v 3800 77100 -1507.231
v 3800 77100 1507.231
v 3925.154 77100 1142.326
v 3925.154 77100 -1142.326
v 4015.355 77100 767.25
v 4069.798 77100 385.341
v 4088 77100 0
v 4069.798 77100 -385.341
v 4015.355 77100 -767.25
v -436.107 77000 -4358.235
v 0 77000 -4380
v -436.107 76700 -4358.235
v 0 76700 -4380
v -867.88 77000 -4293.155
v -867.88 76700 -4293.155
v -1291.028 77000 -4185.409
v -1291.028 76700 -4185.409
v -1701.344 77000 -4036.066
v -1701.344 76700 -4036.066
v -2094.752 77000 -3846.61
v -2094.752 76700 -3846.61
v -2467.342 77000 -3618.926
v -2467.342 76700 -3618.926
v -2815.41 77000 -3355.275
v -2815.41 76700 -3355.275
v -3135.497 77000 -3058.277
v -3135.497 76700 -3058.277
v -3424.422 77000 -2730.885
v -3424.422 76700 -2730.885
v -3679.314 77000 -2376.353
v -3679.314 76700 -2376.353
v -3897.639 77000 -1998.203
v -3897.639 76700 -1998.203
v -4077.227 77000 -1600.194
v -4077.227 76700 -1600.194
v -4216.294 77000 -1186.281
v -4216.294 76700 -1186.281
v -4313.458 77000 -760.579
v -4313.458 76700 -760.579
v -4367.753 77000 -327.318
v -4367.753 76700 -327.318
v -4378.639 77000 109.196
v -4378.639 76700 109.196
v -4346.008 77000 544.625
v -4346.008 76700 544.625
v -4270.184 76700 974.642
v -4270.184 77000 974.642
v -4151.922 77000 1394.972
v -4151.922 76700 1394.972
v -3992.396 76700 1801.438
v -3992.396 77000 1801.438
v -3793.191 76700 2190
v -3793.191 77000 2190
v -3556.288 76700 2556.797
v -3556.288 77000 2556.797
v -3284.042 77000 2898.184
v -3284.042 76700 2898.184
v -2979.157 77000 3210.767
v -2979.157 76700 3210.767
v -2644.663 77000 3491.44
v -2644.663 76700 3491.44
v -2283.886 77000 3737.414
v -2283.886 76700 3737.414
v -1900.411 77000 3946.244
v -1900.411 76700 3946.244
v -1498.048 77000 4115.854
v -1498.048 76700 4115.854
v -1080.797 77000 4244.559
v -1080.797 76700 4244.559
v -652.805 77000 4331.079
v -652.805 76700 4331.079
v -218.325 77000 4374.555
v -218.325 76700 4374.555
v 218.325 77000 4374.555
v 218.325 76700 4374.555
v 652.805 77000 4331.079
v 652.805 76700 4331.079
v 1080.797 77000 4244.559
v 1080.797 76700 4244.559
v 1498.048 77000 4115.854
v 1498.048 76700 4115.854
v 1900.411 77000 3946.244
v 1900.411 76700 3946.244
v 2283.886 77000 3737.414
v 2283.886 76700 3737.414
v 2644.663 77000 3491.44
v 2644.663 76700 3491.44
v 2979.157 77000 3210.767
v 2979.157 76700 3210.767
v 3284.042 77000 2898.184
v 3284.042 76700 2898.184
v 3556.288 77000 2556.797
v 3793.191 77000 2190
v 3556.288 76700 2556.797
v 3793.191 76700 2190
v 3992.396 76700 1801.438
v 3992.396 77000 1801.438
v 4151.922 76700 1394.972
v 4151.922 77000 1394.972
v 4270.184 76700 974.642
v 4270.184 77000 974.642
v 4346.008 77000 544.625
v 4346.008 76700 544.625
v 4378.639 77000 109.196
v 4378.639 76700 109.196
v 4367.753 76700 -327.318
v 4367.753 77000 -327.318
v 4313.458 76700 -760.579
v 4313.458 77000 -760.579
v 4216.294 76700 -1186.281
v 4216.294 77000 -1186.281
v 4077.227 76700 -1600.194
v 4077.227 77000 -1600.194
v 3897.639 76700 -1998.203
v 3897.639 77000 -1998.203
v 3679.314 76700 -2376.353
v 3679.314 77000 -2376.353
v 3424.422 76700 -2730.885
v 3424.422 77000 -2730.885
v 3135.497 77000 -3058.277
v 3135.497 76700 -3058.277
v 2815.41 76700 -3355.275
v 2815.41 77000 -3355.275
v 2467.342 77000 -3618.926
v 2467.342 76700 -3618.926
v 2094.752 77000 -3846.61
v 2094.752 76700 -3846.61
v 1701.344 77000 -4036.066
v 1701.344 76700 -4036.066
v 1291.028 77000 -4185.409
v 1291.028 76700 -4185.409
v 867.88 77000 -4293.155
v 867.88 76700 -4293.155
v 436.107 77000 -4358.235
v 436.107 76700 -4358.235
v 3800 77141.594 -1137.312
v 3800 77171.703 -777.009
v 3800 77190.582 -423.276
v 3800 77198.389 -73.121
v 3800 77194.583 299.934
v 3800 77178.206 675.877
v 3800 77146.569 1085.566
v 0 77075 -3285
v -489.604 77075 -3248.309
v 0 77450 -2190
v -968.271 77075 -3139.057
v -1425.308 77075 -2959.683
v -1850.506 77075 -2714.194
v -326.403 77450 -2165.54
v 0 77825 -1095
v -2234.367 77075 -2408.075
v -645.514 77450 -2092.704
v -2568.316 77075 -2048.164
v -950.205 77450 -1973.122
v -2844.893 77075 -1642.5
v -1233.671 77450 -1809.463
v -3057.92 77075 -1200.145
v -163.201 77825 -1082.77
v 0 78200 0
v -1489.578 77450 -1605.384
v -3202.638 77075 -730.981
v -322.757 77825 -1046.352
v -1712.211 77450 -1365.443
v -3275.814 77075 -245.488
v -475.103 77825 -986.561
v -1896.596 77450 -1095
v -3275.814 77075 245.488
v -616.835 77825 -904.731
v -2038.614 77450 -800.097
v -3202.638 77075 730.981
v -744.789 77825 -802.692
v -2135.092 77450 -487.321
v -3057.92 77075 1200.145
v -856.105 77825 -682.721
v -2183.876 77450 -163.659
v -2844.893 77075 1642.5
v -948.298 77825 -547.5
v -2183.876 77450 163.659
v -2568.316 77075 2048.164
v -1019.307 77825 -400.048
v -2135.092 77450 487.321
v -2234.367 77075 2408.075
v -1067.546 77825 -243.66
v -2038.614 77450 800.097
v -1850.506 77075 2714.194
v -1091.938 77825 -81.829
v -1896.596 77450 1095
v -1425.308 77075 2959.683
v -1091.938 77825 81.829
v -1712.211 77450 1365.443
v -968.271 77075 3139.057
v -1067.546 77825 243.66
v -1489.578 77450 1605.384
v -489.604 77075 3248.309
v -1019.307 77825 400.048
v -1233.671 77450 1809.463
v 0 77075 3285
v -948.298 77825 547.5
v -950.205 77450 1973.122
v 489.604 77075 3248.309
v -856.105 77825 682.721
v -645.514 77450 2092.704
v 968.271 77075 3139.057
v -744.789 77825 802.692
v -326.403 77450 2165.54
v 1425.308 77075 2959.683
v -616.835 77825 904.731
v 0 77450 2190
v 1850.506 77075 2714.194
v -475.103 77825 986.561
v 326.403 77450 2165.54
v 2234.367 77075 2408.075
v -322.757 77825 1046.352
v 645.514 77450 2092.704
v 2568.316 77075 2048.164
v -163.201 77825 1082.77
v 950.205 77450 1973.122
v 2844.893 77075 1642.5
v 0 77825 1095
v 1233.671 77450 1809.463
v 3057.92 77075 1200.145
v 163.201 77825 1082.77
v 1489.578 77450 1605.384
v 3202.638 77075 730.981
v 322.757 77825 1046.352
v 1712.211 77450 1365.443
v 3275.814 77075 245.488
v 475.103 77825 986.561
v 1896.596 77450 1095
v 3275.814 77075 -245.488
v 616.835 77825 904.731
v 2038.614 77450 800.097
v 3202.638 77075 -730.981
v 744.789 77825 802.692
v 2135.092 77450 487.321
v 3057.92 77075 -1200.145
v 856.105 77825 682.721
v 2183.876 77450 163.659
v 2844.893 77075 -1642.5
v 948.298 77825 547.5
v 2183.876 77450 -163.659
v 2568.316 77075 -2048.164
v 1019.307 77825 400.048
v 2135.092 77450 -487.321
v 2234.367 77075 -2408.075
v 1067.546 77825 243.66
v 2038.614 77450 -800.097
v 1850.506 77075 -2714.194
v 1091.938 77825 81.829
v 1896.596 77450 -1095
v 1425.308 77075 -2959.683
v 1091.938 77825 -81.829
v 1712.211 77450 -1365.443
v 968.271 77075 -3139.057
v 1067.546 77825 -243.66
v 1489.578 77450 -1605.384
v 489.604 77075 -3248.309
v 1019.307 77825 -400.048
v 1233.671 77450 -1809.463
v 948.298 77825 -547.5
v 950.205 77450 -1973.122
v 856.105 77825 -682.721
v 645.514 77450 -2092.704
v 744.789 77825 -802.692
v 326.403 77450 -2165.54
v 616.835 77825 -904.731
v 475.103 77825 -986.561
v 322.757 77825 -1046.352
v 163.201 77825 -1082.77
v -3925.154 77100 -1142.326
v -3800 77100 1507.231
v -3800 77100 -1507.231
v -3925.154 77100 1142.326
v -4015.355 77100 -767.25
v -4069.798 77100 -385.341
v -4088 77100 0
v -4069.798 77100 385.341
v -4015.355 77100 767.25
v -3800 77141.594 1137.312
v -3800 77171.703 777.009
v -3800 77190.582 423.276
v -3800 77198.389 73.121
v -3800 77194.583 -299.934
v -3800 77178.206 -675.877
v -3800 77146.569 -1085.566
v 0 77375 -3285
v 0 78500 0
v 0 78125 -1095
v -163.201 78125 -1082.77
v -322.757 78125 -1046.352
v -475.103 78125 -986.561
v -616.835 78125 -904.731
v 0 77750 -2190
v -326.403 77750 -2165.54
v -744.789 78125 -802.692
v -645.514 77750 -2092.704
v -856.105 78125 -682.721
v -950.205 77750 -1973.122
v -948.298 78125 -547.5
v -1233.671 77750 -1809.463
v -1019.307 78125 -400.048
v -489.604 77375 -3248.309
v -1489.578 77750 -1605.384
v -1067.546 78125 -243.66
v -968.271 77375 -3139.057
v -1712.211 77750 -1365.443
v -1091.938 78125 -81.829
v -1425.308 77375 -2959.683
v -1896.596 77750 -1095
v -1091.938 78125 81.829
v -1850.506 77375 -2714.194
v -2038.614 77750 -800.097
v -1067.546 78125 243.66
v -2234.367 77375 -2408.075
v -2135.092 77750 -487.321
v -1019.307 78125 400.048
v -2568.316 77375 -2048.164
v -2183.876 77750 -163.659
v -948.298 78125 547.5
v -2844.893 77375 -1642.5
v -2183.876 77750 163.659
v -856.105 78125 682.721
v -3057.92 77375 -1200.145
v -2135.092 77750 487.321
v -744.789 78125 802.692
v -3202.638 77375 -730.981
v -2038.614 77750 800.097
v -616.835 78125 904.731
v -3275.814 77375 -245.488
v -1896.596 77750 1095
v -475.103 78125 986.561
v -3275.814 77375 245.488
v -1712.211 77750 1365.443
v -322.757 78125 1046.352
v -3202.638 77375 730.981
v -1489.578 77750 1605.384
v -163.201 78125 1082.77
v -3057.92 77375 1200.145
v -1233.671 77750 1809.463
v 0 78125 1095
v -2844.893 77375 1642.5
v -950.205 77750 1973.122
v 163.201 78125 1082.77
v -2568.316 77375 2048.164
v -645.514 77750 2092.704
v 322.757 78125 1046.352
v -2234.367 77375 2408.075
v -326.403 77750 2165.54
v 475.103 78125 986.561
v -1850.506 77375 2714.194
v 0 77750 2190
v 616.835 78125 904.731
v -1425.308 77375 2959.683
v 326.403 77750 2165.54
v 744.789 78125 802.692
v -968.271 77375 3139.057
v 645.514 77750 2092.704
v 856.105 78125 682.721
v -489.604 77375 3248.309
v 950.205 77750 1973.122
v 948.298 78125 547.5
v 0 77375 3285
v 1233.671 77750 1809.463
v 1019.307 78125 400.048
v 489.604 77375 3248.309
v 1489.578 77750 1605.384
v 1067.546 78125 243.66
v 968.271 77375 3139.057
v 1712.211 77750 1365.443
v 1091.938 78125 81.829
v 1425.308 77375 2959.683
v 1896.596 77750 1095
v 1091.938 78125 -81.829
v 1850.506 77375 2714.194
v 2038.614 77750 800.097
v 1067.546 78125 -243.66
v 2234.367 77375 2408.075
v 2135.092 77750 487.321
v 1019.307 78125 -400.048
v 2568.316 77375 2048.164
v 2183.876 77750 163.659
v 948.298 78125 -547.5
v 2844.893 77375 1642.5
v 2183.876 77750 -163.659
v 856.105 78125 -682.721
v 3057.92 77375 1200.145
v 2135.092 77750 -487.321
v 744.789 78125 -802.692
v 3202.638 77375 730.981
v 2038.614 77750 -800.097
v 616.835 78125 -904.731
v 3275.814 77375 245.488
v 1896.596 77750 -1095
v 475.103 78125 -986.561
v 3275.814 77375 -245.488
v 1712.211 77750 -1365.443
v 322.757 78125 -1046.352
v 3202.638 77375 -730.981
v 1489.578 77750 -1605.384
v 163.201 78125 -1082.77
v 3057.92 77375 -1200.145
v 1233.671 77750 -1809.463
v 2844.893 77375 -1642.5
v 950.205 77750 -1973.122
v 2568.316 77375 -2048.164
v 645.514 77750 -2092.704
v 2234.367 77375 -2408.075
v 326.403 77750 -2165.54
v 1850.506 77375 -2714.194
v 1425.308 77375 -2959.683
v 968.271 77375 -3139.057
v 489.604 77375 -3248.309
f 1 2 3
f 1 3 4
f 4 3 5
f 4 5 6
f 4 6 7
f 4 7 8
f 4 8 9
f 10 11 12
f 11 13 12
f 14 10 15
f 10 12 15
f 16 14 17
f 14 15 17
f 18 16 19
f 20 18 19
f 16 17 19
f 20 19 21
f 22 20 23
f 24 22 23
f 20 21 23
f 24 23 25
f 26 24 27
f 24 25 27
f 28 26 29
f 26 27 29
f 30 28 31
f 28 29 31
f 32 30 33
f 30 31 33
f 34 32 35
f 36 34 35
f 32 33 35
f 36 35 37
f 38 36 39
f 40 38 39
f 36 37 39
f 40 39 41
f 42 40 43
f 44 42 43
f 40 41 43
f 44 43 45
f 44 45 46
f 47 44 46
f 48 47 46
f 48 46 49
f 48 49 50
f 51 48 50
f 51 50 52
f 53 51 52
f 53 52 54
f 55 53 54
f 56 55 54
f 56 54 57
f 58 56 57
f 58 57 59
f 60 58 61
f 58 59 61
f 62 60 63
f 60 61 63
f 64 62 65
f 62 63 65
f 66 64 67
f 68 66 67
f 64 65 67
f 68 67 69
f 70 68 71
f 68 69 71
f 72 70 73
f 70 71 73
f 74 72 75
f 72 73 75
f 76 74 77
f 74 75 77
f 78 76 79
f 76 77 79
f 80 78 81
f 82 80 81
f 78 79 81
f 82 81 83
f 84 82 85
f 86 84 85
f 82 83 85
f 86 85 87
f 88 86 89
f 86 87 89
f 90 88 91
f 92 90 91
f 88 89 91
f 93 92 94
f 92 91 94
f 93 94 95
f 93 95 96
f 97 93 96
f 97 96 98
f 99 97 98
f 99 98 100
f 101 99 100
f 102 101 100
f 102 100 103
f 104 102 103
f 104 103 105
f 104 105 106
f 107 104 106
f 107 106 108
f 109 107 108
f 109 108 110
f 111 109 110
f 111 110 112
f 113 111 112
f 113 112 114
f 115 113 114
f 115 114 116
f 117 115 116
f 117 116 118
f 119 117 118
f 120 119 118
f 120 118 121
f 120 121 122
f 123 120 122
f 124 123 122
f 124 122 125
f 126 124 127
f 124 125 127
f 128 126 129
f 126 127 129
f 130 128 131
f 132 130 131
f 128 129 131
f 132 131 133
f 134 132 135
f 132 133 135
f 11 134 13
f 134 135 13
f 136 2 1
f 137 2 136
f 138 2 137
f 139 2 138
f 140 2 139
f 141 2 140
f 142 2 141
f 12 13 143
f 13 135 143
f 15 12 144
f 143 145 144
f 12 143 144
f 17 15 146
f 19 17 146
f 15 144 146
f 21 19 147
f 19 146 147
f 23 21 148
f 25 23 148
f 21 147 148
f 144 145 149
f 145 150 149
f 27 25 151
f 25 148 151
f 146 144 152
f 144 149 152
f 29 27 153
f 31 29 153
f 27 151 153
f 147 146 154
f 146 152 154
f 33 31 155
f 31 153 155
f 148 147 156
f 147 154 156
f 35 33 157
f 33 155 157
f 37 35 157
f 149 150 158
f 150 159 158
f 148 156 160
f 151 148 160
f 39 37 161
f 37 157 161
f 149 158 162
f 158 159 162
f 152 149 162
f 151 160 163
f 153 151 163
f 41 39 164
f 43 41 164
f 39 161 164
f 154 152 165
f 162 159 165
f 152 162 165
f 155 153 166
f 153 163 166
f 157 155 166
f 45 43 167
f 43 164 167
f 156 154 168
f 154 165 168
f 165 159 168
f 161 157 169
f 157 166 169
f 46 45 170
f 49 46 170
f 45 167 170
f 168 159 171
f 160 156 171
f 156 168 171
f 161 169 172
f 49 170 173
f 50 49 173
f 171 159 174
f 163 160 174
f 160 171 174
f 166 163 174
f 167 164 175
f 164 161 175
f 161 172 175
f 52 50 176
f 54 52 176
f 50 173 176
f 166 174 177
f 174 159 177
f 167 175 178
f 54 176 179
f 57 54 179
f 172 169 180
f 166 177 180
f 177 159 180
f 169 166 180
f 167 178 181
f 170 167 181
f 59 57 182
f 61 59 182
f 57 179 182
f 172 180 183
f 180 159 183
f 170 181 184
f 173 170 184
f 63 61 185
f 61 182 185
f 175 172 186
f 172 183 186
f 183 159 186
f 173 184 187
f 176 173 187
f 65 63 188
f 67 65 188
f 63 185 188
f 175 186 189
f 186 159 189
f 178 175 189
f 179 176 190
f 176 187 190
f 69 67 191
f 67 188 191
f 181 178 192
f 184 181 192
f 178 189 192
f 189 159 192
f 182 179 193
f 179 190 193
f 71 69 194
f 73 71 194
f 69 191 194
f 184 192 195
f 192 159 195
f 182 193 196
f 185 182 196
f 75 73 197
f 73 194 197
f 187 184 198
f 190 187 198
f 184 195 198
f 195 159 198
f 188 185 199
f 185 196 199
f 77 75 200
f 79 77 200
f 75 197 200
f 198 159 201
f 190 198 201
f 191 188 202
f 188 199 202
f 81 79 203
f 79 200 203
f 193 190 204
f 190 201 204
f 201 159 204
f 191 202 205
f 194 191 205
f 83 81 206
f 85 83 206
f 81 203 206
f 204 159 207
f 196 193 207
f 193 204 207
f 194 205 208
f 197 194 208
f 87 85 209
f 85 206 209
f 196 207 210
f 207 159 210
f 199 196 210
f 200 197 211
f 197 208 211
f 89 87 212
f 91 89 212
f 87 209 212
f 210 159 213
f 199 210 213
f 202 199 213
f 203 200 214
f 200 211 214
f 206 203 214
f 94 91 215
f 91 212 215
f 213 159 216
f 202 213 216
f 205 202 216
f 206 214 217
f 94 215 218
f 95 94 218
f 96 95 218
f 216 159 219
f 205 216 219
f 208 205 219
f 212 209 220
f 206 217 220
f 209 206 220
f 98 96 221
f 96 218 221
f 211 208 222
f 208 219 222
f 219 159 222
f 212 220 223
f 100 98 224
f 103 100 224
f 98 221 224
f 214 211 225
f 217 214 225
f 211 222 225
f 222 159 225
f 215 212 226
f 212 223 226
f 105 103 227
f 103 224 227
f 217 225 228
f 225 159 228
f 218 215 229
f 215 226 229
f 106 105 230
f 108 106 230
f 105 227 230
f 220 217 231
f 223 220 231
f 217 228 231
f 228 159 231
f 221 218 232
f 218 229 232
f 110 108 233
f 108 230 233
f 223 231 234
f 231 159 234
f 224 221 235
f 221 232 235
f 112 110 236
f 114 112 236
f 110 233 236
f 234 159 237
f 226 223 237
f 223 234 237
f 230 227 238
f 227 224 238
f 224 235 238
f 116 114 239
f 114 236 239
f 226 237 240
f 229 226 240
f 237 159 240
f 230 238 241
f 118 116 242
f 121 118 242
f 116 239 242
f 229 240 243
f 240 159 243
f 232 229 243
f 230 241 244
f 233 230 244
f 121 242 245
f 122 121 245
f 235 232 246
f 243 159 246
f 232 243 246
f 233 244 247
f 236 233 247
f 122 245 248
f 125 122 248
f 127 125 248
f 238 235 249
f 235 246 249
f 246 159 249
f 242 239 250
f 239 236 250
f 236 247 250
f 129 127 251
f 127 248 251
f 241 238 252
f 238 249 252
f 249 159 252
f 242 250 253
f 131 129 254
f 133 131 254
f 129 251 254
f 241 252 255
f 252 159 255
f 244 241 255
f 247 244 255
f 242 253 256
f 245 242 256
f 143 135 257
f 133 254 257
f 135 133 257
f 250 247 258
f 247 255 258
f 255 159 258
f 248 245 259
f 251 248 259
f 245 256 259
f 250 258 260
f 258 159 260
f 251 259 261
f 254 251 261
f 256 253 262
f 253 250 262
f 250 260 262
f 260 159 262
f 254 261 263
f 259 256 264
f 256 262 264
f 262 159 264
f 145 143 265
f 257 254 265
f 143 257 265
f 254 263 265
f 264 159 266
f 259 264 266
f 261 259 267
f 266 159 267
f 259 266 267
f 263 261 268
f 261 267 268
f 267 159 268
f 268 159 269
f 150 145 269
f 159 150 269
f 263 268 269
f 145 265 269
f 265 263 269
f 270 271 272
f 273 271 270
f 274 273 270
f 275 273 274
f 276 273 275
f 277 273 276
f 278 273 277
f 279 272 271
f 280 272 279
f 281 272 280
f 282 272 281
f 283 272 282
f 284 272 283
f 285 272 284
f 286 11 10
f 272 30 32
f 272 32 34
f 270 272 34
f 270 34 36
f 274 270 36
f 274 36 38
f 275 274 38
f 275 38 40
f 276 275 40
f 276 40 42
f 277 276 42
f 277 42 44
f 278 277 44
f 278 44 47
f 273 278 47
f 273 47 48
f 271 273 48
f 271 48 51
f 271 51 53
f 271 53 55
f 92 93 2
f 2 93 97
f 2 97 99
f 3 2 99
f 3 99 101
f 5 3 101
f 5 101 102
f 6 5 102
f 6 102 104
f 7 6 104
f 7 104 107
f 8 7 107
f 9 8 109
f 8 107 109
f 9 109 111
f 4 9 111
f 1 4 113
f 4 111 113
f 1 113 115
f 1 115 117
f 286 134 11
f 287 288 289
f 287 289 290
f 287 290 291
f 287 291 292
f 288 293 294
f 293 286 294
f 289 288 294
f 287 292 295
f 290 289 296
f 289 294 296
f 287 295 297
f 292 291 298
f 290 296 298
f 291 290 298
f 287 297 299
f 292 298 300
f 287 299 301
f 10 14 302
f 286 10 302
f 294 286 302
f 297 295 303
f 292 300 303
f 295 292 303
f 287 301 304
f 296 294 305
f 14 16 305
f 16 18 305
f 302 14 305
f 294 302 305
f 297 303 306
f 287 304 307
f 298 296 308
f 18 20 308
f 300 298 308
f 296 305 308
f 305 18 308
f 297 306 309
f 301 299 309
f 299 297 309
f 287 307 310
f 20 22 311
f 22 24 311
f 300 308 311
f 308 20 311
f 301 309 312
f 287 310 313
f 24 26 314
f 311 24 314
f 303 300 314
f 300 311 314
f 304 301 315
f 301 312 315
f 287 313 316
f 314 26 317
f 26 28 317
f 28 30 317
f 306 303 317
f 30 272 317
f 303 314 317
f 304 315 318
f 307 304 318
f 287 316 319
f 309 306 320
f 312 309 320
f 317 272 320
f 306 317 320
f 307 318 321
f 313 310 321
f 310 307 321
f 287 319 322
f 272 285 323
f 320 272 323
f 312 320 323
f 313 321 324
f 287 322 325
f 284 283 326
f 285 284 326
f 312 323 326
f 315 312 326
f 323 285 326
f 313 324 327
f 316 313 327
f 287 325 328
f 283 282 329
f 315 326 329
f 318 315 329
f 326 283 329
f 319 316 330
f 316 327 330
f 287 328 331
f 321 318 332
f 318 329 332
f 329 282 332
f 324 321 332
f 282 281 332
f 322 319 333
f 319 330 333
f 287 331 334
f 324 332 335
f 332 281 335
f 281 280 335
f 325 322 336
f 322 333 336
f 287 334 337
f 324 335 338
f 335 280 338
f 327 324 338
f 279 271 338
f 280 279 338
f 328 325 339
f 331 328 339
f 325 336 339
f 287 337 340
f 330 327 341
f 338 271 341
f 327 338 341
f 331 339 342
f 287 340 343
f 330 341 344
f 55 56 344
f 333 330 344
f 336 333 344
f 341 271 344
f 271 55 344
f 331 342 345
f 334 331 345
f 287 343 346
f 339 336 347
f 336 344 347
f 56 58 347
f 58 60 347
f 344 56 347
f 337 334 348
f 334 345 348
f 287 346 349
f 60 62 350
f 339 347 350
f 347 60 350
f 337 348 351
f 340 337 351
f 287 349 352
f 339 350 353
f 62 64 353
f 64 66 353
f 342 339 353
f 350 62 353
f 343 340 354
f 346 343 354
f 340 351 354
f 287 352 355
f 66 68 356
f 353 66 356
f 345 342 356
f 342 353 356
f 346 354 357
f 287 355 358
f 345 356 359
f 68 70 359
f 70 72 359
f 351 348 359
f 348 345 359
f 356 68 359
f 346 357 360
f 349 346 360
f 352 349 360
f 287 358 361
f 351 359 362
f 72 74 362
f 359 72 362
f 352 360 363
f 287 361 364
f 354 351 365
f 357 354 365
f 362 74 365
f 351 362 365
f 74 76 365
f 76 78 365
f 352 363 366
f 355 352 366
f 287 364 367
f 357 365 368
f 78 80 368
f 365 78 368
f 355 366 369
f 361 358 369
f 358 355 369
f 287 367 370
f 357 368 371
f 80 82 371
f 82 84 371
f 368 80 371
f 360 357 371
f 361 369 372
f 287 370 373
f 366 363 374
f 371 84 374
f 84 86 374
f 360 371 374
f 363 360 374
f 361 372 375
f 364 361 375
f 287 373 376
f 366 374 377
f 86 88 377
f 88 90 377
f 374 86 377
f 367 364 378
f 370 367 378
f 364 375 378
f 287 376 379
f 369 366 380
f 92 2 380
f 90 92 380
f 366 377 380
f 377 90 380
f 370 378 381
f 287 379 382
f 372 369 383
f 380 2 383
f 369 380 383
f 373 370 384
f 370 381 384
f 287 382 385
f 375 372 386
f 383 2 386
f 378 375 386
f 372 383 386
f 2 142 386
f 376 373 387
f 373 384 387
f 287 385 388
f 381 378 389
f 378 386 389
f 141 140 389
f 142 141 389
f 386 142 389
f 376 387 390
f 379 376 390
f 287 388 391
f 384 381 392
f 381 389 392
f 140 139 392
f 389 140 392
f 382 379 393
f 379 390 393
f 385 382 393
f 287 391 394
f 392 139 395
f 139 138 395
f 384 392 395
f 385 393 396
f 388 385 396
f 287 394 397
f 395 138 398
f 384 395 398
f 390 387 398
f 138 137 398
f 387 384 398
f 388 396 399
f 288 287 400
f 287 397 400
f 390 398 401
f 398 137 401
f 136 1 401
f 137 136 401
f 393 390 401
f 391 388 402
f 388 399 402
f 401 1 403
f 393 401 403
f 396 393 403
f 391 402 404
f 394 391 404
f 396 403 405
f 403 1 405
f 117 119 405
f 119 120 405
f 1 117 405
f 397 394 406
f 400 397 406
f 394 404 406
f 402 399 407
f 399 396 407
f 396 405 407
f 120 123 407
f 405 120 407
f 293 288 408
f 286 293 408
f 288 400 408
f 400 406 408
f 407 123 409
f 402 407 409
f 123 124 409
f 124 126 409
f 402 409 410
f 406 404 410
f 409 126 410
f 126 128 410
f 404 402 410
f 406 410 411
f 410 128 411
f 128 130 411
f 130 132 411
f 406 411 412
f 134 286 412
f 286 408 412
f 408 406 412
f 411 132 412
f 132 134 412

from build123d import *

# Parameters (mm, degrees)
SKETCH3_W          = 700
SKETCH3_H          = 2300
SKETCH3_W_2        = 800
CUT_EXTRUDE1_DEPTH = 2000


with BuildPart() as part:
    # Sketch2 → Revolve2 (revolve)
    with BuildSketch(Plane.XY, mode=Mode.PRIVATE) as revolve2_sk:
        Polygon((0, 78500), (4380, 77000), (4380, 76700), (0, 78200), align=None)
    revolve(revolve2_sk.sketch.rotate(Axis((0, 76500, 0), (0, 1, 0)), 90), axis=Axis((0, 76500, 0), (0, 1, 0)))

    # Sketch3 → Cut-Extrude1 (cut, symmetric)
    with BuildSketch(Plane.XY):
        with Locations((4150, 78250)):
            Rectangle(SKETCH3_W, SKETCH3_H)
        with Locations((-4200, 78250)):
            Rectangle(SKETCH3_W_2, SKETCH3_H)
    extrude(amount=CUT_EXTRUDE1_DEPTH, both=True, mode=Mode.SUBTRACT)


solid = part.part
